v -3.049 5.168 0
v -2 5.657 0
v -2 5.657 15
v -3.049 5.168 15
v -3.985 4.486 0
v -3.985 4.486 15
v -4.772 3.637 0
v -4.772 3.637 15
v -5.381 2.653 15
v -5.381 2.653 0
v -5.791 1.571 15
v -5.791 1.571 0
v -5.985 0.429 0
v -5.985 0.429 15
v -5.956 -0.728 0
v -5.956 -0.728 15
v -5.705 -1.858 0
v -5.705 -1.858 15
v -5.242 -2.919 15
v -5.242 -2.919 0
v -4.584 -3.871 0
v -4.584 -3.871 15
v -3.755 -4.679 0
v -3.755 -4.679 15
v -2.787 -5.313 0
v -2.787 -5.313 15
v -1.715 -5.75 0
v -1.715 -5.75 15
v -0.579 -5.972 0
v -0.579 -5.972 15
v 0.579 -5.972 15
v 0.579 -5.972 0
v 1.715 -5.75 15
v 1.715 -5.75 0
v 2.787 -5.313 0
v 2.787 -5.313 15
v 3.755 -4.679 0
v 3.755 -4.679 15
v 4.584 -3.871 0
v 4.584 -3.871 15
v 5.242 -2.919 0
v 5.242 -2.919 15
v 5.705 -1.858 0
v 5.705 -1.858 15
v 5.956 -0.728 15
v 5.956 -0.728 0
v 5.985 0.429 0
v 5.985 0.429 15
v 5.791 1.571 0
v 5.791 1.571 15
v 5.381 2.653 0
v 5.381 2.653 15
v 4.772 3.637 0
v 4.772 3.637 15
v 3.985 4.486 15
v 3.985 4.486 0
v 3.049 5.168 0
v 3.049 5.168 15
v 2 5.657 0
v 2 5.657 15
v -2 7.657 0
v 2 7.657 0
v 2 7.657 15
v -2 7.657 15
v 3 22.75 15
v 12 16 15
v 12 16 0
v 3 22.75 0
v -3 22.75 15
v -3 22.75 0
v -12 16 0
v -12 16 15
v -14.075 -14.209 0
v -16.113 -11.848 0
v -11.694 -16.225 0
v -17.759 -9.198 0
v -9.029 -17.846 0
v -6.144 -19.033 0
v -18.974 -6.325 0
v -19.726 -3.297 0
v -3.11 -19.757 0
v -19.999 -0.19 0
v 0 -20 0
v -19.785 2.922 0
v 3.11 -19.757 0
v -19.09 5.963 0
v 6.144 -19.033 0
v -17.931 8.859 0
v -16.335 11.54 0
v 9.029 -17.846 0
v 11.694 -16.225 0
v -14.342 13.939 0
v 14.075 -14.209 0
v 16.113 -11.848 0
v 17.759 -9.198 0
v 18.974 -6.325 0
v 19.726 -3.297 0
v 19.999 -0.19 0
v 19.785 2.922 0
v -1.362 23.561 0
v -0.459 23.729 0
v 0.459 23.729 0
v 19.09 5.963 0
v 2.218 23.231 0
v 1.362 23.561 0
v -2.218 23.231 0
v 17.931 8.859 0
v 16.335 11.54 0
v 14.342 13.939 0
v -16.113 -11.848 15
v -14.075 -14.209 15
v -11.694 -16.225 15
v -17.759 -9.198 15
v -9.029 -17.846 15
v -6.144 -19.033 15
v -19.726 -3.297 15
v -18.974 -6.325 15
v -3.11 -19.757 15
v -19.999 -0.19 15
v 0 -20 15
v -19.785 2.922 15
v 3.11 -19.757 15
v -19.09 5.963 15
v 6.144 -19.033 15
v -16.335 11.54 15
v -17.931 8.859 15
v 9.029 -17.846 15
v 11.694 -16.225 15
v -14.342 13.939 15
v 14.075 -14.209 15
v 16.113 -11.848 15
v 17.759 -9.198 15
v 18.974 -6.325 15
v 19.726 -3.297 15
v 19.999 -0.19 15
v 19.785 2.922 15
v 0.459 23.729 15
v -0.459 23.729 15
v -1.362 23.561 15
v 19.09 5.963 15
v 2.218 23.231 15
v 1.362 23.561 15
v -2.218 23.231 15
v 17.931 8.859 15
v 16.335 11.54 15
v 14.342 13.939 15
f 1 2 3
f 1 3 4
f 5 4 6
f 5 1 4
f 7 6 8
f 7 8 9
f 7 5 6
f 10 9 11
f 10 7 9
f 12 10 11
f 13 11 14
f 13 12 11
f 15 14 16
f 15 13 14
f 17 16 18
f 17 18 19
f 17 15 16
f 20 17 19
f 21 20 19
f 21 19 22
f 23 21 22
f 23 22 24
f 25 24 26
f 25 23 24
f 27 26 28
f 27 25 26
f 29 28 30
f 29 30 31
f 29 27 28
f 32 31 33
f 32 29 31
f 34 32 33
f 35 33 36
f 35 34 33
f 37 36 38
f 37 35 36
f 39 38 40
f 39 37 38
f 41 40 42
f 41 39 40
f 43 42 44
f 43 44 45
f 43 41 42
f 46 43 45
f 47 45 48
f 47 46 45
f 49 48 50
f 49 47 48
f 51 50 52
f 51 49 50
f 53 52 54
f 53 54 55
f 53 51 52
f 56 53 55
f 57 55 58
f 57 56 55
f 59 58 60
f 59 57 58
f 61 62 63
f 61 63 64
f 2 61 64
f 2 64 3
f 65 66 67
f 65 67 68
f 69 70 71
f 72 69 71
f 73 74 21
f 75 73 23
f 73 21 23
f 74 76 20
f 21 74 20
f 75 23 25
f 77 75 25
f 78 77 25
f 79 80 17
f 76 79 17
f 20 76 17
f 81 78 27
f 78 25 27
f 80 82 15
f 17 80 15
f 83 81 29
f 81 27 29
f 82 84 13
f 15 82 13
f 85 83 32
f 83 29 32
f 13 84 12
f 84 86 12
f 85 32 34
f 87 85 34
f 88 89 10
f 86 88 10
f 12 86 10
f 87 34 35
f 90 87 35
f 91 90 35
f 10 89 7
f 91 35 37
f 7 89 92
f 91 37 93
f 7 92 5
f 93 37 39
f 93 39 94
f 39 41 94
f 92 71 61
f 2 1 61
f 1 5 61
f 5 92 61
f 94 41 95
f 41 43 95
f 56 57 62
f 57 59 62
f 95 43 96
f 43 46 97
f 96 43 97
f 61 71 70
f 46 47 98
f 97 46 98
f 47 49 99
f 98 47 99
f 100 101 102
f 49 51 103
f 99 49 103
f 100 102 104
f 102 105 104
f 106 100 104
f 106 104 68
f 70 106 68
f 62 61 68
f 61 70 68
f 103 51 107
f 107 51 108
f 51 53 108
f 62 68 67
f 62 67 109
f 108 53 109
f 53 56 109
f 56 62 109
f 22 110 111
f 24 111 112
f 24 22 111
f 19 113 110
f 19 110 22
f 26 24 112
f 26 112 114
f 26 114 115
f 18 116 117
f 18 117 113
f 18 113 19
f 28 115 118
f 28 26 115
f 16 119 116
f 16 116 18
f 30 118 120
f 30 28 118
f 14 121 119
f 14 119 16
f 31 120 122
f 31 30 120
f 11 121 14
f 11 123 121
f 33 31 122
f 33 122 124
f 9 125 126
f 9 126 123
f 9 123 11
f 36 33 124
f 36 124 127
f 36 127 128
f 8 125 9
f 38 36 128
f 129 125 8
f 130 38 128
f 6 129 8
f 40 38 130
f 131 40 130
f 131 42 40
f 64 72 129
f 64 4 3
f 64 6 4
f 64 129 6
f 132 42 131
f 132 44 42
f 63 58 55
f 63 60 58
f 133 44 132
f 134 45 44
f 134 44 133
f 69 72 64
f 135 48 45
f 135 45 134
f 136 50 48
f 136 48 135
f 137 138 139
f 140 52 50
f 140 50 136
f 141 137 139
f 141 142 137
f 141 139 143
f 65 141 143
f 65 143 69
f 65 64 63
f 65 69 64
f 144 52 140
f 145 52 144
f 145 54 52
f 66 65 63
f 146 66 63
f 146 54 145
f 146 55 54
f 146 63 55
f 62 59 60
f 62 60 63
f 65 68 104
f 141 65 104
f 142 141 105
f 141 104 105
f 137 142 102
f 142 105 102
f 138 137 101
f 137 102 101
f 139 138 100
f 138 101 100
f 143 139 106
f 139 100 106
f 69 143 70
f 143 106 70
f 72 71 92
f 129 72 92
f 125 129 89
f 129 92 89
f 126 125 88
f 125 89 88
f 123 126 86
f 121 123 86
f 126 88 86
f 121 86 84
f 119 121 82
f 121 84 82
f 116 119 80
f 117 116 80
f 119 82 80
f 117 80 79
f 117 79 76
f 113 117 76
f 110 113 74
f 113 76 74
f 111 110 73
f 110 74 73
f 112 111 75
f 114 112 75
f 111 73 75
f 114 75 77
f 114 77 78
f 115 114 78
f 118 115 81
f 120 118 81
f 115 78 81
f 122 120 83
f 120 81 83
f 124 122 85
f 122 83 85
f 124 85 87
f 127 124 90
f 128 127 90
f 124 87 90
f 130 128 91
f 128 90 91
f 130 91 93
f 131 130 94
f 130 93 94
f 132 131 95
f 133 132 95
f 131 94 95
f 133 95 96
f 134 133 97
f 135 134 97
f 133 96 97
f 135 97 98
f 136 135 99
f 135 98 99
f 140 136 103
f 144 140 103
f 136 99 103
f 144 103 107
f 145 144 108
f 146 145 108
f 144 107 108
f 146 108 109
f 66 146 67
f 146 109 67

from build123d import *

# Parameters (mm, degrees)
BOSS_EXTRUDE1_DEPTH = 15


with BuildPart() as part:
    # Sketch1 → Boss-Extrude1 (new body)
    with BuildSketch(Plane.XY):
        with BuildLine():
            Line((-3, 22.75), (-12, 16))
            ThreePointArc((-12, 16), (0, -20), (12, 16))
            Line((12, 16), (3, 22.75))
            ThreePointArc((3, 22.75), (0, 23.75), (-3, 22.75))
        make_face()
        with BuildLine():
            Line((2, 7.656854249), (-2, 7.656854249))
            Line((-2, 7.656854249), (-2, 5.656854249))
            ThreePointArc((-2, 5.656854249), (0, -6), (2, 5.656854249))
            Line((2, 5.656854249), (2, 7.656854249))
        make_face(mode=Mode.SUBTRACT)
    extrude(amount=BOSS_EXTRUDE1_DEPTH)


solid = part.part
